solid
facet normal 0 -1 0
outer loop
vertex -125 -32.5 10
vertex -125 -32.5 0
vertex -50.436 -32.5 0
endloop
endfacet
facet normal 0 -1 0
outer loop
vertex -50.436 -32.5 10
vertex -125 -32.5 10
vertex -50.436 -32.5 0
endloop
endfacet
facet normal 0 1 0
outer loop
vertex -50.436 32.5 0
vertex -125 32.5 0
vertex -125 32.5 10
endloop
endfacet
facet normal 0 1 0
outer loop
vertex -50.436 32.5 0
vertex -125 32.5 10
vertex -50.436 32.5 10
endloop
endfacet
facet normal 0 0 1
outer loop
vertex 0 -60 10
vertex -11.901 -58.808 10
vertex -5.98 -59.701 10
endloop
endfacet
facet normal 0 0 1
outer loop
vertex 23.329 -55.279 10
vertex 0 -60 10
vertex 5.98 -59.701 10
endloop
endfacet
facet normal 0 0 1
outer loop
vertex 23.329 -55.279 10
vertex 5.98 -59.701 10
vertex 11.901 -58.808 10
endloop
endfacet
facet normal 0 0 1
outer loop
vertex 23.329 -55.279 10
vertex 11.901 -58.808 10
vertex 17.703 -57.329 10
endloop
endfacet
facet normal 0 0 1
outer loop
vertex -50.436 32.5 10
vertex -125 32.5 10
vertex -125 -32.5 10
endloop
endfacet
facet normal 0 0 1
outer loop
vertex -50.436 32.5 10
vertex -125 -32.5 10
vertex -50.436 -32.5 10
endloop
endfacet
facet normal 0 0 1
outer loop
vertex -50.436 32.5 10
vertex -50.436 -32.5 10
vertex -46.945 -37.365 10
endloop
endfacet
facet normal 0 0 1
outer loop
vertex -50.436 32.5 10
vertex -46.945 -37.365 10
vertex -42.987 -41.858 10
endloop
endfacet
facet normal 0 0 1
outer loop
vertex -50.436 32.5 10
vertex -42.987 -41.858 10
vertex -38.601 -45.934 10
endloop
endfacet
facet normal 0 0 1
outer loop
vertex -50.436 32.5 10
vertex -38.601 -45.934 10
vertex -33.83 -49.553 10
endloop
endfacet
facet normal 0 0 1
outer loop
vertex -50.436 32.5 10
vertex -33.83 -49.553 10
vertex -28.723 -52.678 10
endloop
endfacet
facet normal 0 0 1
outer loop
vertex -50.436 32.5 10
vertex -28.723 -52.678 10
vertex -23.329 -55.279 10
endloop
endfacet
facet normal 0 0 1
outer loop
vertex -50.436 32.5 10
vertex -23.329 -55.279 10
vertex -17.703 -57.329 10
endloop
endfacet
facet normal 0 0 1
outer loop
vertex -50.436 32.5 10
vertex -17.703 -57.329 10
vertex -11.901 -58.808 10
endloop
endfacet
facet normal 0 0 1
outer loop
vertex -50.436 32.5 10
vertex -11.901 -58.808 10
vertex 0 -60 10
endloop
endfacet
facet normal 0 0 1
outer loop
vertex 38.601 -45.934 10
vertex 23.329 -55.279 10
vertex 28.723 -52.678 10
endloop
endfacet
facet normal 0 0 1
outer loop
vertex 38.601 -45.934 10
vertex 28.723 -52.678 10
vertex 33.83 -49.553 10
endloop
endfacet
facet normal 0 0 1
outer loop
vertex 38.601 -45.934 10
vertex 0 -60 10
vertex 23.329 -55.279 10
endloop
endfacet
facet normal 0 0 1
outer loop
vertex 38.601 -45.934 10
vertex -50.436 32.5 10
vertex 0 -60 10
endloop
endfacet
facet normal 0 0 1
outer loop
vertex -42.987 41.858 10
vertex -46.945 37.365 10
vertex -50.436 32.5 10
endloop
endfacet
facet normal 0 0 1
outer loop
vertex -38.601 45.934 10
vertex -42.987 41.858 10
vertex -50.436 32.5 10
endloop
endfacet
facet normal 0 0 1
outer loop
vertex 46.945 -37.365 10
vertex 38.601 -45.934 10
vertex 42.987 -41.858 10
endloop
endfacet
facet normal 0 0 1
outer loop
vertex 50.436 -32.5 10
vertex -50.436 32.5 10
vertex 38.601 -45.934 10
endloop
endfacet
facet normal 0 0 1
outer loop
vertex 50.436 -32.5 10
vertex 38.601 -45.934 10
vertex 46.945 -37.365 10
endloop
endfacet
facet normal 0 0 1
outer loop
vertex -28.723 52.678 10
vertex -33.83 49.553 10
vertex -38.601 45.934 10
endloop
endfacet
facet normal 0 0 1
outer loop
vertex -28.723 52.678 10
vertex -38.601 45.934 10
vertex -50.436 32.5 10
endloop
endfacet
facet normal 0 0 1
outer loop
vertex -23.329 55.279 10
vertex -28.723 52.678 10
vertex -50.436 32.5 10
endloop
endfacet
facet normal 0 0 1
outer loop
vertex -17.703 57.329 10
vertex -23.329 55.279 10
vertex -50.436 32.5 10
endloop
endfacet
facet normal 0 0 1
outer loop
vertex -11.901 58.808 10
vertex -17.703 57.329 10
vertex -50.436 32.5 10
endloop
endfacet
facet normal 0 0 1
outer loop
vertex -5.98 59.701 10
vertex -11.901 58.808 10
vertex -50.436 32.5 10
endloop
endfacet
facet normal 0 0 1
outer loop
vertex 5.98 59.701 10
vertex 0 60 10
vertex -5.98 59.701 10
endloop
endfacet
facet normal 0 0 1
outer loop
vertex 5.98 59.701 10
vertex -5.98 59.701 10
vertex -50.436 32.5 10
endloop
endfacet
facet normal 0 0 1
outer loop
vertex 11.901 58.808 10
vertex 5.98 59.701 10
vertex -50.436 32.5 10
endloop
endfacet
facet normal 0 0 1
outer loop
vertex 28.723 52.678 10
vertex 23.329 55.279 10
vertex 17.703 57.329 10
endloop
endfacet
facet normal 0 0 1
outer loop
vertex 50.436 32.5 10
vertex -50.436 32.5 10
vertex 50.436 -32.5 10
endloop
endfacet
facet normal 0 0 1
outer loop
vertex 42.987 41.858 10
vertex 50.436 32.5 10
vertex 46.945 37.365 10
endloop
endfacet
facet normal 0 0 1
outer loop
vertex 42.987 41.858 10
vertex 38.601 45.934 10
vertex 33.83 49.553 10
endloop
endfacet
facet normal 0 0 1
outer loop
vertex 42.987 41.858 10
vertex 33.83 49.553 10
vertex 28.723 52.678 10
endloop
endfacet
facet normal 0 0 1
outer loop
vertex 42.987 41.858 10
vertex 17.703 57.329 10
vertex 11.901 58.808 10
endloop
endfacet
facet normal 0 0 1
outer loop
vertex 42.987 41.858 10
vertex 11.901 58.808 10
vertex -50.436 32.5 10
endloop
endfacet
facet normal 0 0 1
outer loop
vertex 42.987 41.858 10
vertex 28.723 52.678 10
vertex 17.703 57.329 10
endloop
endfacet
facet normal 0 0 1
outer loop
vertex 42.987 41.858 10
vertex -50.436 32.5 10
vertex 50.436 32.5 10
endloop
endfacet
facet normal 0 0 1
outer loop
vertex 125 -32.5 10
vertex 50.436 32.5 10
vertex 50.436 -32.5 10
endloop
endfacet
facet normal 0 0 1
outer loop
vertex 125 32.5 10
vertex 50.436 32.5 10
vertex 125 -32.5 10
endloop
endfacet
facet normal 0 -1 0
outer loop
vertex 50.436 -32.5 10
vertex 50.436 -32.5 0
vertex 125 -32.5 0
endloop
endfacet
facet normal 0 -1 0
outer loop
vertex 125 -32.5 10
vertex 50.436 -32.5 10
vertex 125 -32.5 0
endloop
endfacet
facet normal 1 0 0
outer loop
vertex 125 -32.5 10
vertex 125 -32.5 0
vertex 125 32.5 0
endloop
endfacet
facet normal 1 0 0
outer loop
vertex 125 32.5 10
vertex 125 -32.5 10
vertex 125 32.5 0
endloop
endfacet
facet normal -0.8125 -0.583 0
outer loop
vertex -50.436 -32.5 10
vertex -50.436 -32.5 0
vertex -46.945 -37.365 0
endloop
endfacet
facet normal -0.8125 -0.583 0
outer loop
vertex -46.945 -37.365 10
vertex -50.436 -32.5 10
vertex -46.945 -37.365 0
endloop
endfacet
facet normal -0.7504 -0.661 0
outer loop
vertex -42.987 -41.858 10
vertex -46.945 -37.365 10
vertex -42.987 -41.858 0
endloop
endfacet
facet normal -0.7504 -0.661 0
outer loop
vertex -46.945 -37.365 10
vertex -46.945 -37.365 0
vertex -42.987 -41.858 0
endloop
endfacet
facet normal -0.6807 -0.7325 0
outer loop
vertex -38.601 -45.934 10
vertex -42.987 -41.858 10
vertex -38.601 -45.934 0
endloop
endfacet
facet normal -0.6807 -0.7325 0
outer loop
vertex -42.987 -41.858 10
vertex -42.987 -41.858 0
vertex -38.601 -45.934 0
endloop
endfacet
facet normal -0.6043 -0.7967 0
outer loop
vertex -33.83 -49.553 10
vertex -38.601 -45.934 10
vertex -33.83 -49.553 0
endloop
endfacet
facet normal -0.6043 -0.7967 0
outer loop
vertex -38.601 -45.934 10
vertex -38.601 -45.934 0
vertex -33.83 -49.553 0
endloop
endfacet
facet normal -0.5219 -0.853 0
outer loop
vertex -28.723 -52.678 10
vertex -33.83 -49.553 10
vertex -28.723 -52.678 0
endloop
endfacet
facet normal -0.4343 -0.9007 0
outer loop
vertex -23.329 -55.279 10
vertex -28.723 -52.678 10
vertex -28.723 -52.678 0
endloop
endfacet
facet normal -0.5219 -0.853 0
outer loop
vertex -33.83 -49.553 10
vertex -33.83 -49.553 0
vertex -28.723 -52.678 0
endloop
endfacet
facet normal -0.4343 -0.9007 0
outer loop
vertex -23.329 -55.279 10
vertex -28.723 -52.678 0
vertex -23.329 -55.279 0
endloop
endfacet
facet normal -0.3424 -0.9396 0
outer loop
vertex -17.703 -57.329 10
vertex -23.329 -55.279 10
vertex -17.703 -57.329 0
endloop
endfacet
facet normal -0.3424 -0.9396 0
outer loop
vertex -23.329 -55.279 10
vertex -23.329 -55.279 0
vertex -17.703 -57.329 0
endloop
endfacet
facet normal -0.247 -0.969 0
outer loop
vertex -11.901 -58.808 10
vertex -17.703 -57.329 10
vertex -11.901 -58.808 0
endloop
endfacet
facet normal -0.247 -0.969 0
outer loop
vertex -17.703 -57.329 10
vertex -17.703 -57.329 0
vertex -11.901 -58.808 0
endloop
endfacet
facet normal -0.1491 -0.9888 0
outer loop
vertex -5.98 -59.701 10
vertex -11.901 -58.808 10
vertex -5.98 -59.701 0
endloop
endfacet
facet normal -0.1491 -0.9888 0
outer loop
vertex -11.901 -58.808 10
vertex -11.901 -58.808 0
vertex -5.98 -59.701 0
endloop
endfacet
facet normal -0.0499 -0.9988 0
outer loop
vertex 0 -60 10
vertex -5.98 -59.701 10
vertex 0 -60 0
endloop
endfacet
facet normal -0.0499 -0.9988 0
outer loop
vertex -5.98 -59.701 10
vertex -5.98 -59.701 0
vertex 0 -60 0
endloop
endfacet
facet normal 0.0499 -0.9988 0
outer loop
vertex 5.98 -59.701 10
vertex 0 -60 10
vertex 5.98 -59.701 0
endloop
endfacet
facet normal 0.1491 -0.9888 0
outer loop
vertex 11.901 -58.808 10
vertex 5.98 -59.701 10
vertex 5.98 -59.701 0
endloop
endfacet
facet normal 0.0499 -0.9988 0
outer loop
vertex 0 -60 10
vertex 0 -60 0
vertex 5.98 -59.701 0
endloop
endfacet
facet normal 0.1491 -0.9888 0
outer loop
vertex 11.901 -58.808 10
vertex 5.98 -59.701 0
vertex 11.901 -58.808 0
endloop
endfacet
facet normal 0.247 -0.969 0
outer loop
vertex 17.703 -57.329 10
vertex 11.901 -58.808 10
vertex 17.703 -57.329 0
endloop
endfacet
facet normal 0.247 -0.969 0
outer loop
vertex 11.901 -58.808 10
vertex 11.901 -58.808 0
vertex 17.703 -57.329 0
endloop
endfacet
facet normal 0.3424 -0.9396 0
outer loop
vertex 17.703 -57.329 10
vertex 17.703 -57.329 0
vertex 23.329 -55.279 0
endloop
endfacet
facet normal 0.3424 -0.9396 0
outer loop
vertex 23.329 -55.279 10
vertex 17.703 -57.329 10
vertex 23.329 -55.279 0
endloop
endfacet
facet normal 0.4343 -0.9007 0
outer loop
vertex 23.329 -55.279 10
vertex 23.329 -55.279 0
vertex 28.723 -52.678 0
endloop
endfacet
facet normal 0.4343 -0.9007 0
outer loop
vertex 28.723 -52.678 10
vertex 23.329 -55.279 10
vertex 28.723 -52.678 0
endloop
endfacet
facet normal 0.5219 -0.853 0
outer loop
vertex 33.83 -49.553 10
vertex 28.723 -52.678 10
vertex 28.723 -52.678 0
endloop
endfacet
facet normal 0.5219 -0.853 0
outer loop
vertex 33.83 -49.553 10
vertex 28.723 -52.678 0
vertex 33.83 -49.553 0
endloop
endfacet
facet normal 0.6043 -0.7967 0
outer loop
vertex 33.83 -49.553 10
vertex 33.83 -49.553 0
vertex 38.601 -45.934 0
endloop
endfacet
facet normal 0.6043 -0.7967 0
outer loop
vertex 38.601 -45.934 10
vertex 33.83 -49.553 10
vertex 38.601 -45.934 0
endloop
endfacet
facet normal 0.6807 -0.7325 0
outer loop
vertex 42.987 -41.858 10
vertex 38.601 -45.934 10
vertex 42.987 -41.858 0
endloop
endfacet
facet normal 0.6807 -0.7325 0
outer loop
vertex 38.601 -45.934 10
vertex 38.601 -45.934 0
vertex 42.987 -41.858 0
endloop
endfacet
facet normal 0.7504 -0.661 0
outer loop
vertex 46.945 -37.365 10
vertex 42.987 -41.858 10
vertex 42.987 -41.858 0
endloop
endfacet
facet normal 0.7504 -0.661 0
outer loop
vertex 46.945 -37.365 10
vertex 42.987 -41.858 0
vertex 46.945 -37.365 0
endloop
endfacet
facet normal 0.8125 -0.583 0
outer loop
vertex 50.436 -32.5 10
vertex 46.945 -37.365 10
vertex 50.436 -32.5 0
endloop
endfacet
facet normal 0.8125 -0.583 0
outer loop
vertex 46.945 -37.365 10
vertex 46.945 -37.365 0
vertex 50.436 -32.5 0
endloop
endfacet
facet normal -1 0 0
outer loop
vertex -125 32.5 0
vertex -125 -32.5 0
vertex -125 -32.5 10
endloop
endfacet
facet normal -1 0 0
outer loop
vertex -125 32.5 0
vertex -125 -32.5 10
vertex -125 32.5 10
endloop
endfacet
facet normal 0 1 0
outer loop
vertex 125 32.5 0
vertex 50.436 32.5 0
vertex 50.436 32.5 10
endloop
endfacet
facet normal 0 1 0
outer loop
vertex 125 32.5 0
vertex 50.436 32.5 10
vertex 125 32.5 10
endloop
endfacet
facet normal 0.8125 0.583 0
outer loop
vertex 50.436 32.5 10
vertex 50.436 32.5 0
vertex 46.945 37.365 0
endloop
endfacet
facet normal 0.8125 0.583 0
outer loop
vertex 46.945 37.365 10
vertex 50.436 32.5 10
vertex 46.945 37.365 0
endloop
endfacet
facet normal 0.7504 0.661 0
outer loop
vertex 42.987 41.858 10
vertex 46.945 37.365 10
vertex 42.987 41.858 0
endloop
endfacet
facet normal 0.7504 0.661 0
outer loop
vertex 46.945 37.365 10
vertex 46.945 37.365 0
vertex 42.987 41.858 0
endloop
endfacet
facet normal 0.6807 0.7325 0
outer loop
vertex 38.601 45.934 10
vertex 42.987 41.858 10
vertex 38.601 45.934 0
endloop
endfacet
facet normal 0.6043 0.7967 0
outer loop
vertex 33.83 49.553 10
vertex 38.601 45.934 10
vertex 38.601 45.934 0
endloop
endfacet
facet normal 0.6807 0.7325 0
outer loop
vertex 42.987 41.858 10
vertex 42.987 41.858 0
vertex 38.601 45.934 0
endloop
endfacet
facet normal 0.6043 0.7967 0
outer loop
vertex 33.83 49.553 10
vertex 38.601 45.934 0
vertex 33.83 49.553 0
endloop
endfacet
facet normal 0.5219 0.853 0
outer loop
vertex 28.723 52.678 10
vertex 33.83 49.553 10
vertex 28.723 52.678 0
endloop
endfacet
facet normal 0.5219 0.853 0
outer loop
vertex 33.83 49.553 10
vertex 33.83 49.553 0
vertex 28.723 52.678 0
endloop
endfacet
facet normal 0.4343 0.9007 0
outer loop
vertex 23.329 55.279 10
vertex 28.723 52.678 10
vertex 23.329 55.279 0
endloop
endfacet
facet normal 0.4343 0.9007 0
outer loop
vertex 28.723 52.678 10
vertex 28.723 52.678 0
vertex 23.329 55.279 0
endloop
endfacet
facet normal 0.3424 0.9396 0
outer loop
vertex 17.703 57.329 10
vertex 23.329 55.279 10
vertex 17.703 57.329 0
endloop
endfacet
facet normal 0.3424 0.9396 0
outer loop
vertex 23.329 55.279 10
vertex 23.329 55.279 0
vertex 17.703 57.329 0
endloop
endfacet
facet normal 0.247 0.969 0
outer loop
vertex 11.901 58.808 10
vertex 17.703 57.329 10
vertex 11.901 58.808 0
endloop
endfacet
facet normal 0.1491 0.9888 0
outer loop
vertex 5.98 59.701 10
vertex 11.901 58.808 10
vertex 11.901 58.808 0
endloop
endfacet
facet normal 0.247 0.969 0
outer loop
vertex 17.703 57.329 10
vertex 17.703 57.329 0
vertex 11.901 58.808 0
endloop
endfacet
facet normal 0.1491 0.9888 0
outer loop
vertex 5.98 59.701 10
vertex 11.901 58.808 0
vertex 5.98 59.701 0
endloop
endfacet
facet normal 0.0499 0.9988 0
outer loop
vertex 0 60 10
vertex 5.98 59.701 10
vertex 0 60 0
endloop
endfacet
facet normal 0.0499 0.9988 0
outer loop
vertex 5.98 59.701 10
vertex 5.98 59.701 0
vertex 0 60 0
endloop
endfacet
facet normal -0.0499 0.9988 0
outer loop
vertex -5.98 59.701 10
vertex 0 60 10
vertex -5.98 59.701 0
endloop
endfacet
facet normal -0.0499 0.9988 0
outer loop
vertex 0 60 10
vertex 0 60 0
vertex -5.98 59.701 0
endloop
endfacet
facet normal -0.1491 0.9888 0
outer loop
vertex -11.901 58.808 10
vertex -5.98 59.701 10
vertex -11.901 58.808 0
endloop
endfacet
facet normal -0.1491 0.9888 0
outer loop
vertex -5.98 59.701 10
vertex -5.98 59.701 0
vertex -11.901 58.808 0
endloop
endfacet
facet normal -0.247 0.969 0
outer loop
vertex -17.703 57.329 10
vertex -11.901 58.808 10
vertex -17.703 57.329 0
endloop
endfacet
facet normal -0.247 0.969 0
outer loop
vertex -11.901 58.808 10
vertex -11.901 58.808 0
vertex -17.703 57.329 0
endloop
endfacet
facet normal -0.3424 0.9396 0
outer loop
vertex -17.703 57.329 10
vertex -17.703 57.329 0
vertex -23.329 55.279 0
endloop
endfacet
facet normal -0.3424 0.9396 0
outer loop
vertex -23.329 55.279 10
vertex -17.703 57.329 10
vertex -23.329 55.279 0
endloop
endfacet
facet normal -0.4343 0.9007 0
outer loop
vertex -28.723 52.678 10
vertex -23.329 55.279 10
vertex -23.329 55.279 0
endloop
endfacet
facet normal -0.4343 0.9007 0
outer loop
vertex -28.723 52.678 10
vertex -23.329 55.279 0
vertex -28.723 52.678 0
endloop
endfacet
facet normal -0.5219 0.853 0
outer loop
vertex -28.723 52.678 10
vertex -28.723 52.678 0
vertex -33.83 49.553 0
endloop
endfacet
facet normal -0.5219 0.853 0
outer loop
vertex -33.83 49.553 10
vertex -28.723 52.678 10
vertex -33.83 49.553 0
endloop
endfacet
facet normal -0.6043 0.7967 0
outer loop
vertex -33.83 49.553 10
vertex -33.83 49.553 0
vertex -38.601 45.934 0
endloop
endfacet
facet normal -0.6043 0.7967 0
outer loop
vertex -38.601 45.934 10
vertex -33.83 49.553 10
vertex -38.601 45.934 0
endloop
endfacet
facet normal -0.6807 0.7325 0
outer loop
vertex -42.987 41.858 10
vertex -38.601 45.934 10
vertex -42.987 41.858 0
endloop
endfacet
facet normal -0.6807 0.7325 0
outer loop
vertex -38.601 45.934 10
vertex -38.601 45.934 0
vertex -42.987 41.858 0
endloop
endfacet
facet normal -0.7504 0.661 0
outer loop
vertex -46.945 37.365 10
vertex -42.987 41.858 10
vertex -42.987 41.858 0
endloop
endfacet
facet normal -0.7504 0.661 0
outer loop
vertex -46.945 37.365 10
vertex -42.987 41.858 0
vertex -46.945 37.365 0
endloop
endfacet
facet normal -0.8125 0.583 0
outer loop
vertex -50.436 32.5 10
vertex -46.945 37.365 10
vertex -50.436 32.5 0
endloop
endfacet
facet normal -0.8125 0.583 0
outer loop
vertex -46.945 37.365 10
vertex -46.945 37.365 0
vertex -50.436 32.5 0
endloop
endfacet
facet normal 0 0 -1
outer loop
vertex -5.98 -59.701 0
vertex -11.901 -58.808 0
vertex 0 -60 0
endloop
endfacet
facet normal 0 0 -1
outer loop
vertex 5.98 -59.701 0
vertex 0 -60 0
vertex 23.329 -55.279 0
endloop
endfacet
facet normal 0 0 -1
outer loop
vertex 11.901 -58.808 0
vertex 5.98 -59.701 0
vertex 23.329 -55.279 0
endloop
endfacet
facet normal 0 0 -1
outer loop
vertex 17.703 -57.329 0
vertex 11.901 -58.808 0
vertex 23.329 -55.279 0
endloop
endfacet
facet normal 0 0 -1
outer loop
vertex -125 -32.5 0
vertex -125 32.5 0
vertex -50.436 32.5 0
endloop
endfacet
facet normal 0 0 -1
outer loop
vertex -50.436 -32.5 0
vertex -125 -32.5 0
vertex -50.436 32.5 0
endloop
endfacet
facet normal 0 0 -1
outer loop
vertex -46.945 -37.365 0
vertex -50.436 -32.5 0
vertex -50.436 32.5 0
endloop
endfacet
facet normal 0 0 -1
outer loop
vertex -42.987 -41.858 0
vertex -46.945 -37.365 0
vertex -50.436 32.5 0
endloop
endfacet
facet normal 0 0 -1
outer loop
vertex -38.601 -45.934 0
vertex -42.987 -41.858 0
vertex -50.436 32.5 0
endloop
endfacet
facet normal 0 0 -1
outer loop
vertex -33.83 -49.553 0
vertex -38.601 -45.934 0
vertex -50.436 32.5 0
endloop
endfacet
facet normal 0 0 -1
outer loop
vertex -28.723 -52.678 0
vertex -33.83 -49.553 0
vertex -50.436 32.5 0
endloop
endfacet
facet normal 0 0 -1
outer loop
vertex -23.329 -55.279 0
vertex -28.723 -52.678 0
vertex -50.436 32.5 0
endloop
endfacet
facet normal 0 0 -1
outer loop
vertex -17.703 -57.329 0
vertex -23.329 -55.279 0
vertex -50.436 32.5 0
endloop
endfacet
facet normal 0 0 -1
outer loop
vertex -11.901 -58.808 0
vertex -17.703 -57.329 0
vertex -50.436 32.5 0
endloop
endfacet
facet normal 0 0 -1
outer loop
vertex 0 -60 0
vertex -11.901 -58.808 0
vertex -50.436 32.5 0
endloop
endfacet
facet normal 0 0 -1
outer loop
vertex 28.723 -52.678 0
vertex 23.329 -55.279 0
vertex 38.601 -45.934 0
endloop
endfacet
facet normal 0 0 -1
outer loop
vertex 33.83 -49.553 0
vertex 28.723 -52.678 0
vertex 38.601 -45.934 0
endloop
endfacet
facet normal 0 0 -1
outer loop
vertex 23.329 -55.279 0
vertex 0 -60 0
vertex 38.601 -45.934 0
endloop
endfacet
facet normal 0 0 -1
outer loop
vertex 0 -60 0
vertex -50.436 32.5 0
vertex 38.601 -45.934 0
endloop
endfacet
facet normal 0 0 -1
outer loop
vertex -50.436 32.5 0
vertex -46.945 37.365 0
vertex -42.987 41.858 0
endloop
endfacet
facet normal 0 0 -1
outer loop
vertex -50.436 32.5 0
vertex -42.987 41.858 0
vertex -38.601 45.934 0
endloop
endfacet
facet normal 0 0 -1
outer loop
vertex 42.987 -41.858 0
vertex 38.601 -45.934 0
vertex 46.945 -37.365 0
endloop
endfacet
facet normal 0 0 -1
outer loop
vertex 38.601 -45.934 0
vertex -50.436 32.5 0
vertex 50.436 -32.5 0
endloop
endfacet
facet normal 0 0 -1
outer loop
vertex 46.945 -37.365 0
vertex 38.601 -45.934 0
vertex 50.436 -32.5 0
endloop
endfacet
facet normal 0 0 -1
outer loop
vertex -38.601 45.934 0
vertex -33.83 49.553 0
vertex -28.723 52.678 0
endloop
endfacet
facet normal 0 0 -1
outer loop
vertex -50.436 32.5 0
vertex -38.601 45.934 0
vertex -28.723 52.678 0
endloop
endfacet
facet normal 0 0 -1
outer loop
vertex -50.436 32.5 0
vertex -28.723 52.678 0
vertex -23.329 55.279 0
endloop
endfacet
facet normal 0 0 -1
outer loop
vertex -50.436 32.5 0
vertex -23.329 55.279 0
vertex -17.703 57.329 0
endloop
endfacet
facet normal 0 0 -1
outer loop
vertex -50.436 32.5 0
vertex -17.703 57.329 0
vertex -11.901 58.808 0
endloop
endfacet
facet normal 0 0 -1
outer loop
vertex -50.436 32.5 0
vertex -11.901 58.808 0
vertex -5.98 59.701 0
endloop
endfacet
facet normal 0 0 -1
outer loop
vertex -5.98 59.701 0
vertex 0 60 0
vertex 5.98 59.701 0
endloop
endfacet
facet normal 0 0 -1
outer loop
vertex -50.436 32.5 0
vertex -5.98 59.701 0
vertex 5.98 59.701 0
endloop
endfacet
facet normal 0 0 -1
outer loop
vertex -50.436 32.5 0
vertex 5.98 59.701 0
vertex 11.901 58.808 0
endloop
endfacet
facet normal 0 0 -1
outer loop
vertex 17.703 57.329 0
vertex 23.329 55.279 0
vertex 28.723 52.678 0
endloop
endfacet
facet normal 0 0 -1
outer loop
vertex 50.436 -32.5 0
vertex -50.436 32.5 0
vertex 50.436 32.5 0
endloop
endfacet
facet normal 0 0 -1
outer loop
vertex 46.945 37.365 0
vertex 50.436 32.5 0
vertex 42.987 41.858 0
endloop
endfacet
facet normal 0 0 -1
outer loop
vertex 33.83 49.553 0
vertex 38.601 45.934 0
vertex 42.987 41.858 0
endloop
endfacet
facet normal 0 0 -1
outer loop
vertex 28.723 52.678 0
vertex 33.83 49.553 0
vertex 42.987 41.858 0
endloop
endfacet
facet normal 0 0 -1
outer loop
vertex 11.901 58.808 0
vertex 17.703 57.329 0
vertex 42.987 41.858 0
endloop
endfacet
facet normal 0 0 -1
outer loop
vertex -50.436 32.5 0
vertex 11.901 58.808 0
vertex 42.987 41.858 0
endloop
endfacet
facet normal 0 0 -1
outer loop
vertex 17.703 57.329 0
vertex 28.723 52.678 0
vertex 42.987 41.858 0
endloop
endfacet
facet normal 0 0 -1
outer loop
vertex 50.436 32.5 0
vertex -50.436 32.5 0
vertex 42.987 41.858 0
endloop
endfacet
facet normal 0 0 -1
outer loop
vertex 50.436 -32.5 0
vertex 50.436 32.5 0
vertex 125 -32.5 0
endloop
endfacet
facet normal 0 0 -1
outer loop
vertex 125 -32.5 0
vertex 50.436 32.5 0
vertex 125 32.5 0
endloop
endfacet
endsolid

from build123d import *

# Parameters (mm, degrees)
ESQUISSE1_R        = 60
ESQUISSE1_W        = 250
ESQUISSE1_H        = 65
BOSS_EXTRU_1_DEPTH = 10


with BuildPart() as part:
    # Esquisse1 → Boss.-Extru.1 (new body)
    with BuildSketch(Plane.XY):
        Circle(ESQUISSE1_R)
        Rectangle(ESQUISSE1_W, ESQUISSE1_H)
    extrude(amount=BOSS_EXTRU_1_DEPTH)


solid = part.part
